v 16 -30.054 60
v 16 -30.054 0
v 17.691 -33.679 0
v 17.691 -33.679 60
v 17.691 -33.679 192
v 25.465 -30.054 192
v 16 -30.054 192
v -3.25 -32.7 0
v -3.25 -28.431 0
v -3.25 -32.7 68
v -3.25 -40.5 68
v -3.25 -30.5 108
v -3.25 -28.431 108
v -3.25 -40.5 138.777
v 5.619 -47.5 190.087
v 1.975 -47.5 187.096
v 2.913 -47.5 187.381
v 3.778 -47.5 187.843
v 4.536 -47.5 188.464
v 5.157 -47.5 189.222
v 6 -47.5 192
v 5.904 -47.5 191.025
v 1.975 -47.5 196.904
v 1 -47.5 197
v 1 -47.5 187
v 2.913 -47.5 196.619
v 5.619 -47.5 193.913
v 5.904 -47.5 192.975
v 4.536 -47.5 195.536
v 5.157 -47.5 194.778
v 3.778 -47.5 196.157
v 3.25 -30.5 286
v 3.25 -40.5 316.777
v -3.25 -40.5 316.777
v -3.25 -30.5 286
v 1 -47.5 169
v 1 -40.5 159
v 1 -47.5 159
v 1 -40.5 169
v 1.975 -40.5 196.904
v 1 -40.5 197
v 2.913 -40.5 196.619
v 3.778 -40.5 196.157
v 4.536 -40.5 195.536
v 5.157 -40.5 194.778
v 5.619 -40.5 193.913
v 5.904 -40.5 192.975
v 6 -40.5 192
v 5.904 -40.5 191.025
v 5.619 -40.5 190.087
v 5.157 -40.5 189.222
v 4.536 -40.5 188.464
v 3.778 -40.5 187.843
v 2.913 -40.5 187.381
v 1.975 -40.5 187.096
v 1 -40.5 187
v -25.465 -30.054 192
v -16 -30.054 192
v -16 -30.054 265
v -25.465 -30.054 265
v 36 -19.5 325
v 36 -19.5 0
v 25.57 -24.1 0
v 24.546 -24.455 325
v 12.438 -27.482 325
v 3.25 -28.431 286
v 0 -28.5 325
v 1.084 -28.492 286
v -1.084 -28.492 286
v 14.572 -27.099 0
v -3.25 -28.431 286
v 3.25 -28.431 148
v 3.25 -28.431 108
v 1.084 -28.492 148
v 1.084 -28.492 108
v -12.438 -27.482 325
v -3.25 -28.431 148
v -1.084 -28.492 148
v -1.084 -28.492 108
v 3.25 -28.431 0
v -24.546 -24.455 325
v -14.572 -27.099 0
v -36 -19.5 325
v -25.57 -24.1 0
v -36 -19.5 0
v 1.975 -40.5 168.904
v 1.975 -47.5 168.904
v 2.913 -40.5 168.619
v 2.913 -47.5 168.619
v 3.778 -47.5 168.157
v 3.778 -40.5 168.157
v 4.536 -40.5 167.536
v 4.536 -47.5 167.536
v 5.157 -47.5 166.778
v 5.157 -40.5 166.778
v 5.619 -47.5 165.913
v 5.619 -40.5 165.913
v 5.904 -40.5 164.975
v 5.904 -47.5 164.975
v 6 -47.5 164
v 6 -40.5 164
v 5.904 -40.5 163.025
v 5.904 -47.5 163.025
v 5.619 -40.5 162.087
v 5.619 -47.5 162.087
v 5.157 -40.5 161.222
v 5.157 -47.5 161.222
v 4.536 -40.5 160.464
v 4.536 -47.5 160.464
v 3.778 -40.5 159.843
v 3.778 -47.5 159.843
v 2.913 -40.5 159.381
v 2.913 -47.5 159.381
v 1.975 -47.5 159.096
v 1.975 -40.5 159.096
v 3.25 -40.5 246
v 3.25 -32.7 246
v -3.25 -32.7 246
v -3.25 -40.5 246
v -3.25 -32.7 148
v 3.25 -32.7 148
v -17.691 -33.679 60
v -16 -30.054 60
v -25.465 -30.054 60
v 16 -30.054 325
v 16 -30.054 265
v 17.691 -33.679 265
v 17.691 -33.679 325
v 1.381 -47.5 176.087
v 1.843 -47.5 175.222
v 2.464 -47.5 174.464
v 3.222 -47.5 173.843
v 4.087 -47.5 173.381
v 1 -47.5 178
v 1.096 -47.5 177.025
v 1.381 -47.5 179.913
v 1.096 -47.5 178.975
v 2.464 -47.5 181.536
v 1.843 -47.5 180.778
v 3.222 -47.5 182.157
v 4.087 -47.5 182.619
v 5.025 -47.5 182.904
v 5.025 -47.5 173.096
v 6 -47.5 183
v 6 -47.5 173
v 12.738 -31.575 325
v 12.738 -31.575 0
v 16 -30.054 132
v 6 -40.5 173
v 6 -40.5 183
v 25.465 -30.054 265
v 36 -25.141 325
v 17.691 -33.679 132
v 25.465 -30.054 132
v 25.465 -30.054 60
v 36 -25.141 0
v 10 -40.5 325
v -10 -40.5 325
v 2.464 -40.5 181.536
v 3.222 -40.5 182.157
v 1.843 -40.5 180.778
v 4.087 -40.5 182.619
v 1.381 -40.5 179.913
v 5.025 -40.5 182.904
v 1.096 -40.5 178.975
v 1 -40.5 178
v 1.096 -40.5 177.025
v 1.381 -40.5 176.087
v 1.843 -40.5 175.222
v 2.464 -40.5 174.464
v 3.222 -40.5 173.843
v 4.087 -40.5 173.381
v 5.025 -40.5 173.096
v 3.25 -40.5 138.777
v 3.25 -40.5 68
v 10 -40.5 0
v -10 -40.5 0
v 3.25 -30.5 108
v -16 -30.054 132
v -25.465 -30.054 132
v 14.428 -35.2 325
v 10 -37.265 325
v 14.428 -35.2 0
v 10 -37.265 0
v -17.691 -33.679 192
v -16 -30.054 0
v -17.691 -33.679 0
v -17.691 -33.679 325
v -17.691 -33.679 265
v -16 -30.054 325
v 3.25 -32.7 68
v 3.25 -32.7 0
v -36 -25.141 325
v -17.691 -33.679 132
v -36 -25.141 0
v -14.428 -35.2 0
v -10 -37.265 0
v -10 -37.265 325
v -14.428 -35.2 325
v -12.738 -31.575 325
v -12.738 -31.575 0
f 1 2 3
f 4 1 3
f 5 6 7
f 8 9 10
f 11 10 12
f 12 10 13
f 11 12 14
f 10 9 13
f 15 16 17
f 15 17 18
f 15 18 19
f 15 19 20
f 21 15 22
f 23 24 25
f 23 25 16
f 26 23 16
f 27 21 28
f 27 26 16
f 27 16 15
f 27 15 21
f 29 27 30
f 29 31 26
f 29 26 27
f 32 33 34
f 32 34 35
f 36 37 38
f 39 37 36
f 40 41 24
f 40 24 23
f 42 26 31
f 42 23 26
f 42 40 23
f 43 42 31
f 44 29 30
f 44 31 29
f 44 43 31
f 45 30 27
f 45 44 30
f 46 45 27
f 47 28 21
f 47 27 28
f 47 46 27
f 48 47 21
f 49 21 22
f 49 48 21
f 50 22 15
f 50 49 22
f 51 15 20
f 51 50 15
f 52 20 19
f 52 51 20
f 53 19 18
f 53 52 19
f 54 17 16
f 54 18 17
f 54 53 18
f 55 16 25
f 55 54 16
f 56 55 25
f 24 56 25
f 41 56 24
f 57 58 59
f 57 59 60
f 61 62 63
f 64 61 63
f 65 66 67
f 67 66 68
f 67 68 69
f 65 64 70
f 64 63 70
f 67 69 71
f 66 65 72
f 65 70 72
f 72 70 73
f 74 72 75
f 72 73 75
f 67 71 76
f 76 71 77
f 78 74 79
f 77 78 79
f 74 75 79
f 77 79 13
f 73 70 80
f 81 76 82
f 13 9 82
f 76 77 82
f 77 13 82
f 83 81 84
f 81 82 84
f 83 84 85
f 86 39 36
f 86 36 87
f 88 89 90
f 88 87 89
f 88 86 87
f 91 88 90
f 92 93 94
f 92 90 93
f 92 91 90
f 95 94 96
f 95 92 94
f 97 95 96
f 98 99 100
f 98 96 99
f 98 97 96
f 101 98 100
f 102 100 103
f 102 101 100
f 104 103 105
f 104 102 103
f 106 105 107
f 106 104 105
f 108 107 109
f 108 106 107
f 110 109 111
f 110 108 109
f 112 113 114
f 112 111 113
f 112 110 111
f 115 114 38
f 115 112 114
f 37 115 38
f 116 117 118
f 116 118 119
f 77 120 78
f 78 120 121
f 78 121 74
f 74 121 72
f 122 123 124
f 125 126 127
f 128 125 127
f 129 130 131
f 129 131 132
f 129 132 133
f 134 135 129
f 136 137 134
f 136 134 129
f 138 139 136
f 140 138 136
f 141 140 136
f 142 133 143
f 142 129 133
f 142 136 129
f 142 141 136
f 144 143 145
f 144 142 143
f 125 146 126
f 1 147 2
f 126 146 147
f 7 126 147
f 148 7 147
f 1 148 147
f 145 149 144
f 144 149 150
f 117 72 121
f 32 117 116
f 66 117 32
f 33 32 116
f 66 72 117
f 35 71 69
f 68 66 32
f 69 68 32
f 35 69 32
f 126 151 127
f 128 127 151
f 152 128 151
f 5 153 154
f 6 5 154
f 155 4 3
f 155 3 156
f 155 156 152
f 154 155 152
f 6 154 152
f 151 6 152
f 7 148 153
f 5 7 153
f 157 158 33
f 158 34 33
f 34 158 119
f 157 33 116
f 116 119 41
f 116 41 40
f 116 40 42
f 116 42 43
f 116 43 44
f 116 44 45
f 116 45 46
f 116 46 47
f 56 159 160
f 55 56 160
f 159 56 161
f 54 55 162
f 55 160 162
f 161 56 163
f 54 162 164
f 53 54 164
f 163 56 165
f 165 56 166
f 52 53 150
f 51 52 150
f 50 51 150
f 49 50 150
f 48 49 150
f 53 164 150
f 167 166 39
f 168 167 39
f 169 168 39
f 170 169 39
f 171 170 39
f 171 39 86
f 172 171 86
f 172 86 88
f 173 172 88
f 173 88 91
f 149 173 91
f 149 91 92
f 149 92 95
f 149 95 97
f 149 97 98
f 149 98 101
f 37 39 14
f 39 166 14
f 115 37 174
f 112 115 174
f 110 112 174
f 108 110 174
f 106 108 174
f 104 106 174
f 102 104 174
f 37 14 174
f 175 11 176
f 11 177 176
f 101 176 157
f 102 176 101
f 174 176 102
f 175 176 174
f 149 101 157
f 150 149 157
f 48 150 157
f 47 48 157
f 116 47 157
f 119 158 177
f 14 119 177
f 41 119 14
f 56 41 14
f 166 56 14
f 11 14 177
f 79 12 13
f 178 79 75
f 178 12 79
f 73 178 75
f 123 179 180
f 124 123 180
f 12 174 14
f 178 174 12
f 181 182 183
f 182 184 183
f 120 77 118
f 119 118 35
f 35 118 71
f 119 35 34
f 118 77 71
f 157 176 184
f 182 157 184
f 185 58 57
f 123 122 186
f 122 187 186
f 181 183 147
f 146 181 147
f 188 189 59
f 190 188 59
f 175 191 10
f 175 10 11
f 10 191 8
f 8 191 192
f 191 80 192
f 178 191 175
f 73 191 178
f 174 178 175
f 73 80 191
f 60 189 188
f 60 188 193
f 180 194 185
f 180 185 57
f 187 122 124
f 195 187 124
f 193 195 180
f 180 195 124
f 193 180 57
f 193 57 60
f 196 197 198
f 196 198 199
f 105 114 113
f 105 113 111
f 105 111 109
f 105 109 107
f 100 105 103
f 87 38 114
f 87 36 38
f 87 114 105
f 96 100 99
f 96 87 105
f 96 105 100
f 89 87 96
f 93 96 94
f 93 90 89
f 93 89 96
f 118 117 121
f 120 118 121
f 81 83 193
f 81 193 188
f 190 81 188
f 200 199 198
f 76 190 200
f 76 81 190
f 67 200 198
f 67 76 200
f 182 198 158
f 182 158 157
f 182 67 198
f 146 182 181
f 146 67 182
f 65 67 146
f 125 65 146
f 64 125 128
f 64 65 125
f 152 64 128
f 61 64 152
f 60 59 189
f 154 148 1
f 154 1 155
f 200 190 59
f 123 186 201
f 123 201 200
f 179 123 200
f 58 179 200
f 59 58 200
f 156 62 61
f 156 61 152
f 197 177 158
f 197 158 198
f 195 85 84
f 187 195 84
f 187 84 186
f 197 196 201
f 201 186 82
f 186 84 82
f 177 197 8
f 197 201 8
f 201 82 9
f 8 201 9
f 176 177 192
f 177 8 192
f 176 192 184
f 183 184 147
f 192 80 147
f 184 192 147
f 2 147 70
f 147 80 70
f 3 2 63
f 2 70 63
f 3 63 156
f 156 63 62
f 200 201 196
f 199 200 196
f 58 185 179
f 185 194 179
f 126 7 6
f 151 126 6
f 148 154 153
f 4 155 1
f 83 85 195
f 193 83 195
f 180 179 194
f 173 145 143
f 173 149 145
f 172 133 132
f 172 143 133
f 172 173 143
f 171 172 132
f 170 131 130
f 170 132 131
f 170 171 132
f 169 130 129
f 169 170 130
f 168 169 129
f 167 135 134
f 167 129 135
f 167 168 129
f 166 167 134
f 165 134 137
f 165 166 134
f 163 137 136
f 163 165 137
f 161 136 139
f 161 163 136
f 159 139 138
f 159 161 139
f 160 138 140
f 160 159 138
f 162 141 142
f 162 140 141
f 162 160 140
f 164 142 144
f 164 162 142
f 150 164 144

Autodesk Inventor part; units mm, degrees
sketch "Sketch1" plane through (0, 0, 0) normal (0, 0, 1) x (1, 0, 0)
  line L0 (0, 0) -> (-20.6965, 9.6509) construction
  line L1 (0, 0) -> (0, -60.6509) construction
  line L2 (0, 0) -> (-23.2307, -49.8183) construction
  line L3 (0, 0) -> (21.0241, 9.8037) construction
  line L4 (0, 0) -> (21.5225, -46.1553) construction
  line L5 (0, 0) -> (0, 48) construction
  arc A0 (-36, -19.5) -> (36, -19.5) centre (0, 48) ccw
  line L6 (-36, -19.5) -> (-36, -25.1413)
  line L7 (36, -19.5) -> (36, -25.1413)
  line L8 (-10, -40.5) -> (10, -40.5)
  line L9 (-10, -40.5) -> (-10, -37.2653)
  line L10 (10, -40.5) -> (10, -37.2653)
  line L11 (-17.6908, -33.679) -> (-16.0004, -30.0538)
  line L12 (-16.0004, -30.0538) -> (-12.7377, -31.5752)
  line L13 (-12.7377, -31.5752) -> (-14.4281, -35.2004)
  line L14 (14.4281, -35.2004) -> (12.7377, -31.5752)
  line L15 (12.7377, -31.5752) -> (16.0004, -30.0538)
  line L16 (16.0004, -30.0538) -> (17.6908, -33.679)
  line L17 (10, -37.2653) -> (14.4281, -35.2004)
  line L18 (17.6908, -33.679) -> (36, -25.1413)
  line L19 (-10, -37.2653) -> (-14.4281, -35.2004)
  line L20 (-17.6908, -33.679) -> (-36, -25.1413)
  dimension "d0" = 25
  dimension "d1" = 90
  dimension "d2" = 90
  dimension "d3" = 25
  dimension "d4" = 48
  dimension "d5" = 153
  dimension "d11" = 72
  dimension "d12" = 36
  dimension "d13" = 20
  dimension "d14" = 10
  dimension "d17" = 88.5
  dimension "d18" = 3.6
  dimension "d19" = 1.8
  dimension "d20" = 4
  dimension "d21" = 1.8
  dimension "d22" = 1.8
  dimension "d23" = 4
extrude "Extrusion1" add sketch "Sketch1" along normal blind 325
ref_plane "Work Plane1" through (0, 0, 60) normal (0, 0, -1) x (-1, 0, 0)
sketch "Sketch2" plane through (0, 0, 60) normal (0, 0, -1) x (-1, 0, 0)
  line L0 (14.4281, -35.2004) -> (12.7377, -31.5752)
  line L1 (12.7377, -31.5752) -> (16.0004, -30.0538)
  line L2 (14.4281, -35.2004) -> (10, -37.2653) projected
  line L3 (16.0004, -30.0538) -> (25.4652, -30.0538)
  line L4 (25.4652, -30.0538) -> (14.4281, -35.2004)
  line L5 (12.7377, -31.5752) -> (14.4281, -35.2004) projected
  line L6 (16.0004, -30.0538) -> (12.7377, -31.5752) projected
  line L7 (36, -25.1413) -> (17.6908, -33.679) projected
  line L8 (10, -40.5) -> (-10, -40.5) projected
  line L9 (-14.4281, -35.2004) -> (-12.7377, -31.5752)
  line L10 (-12.7377, -31.5752) -> (-16.0004, -30.0538)
  line L11 (-16.0004, -30.0538) -> (-25.4652, -30.0538)
  line L12 (-25.4652, -30.0538) -> (-14.4281, -35.2004)
  line L13 (-14.4281, -35.2004) -> (-12.7377, -31.5752) projected
  line L14 (-12.7377, -31.5752) -> (-16.0004, -30.0538) projected
  line L15 (-10, -37.2653) -> (-14.4281, -35.2004) projected
  line L16 (-17.6908, -33.679) -> (-36, -25.1413) projected
  point P0 (0, 0)
extrude "Extrusion2" cut sketch "Sketch2" against normal blind 72
ref_plane "Work Plane2" through (0, 0, 192) normal (0, 0, -1) x (-1, 0, 0)
sketch "Sketch3" plane through (0, 0, 192) normal (0, 0, -1) x (-1, 0, 0)
  line L0 (14.4281, -35.2004) -> (12.7377, -31.5752)
  line L1 (12.7377, -31.5752) -> (14.4281, -35.2004) projected
  line L2 (12.7377, -31.5752) -> (16.0004, -30.0538)
  line L3 (16.0004, -30.0538) -> (25.4652, -30.0538)
  line L4 (25.4652, -30.0538) -> (14.4281, -35.2004)
  line L5 (-14.4281, -35.2004) -> (-12.7377, -31.5752)
  line L6 (-12.7377, -31.5752) -> (-16.0004, -30.0538)
  line L7 (-16.0004, -30.0538) -> (-25.4652, -30.0538)
  line L8 (-25.4652, -30.0538) -> (-14.4281, -35.2004)
  line L9 (16.0004, -30.0538) -> (12.7377, -31.5752) projected
  line L10 (14.4281, -35.2004) -> (10, -37.2653) projected
  line L11 (-14.4281, -35.2004) -> (-12.7377, -31.5752) projected
  line L12 (-12.7377, -31.5752) -> (-16.0004, -30.0538) projected
  line L13 (-10, -37.2653) -> (-14.4281, -35.2004) projected
  line L14 (10, -40.5) -> (-10, -40.5) projected
  line L15 (36, -25.1413) -> (17.6908, -33.679) projected
  point P0 (0, 0)
extrude "Extrusion3" cut sketch "Sketch3" against normal blind 73
ref_plane "Work Plane3" through (0, -25.1413, 0) normal (-1, 0, 0) x (0, 0, 1)
sketch "Sketch5" plane through (0, -25.1413, 0) normal (-1, 0, 0) x (0, 0, 1)
  line L0 (0, -7.5587) -> (0, -3.3587)
  line L1 (68, -7.5587) -> (68, -15.3587)
  line L2 (68, -15.3587) -> (138.7768, -15.3587)
  line L3 (138.7768, -15.3587) -> (108, -5.3587)
  line L4 (108, -5.3587) -> (108, -3.3587)
  line L5 (0, -15.3587) -> (325, -15.3587) projected
  line L6 (246, -7.5587) -> (246, -15.3587)
  line L7 (246, -15.3587) -> (316.7768, -15.3587)
  line L8 (68, -7.5587) -> (0, -7.5587)
  line L9 (286, -3.3587) -> (286, -5.3587)
  line L10 (316.7768, -15.3587) -> (286, -5.3587)
  line L11 (0, -3.3587) -> (0, -0.3587)
  line L12 (0, -8.5377) -> (0, 0) projected
  line L13 (0, 5.6413) -> (325, 5.6413) projected
  line L14 (286, -0.3587) -> (286, -3.3587)
  line L15 (246, -7.5587) -> (148, -7.5587)
  line L16 (148, -7.5587) -> (148, -3.3587)
  line L17 (108, -0.3587) -> (108, -3.3587)
  line L18 (325, -3.3587) -> (0, -3.3587) projected
  line L19 (148, -3.3587) -> (148, -0.3587)
  line L20 (0, -3.3587) -> (108, -3.3587)
  line L21 (148, -3.3587) -> (286, -3.3587)
  line L22 (0, -0.3587) -> (108, -0.3587)
  line L23 (148, -0.3587) -> (286, -0.3587)
  point P0 (0, 25.1413)
  dimension "d51" = 4.2
  dimension "d52" = 0
  dimension "d53" = 68
  dimension "d54" = 2
  dimension "d56" = 40
  dimension "d59" = 246
  dimension "d64" = 18
  dimension "d65" = 2
  dimension "d68" = 3
  dimension "d69" = 40
  dimension "d84" = 178
  dimension "d94" = 18
  dimension "d96" = 40
extrude "Extrusion4" cut sketch "Sketch5" along normal mid plane 6.5 contours L0 L18 L4 L3 L2 L1 L8 | L11 L22 L17 L18 | L18 L9 L10 L5 L6 L15 L16 | L19 L23 L14 L18
sketch "Sketch6" plane through (-10, -40.5, 0) normal (0, -1, 0) x (1, 0, 0)
  line L0 (-49, 178) -> (79, 178) construction
  line L1 (10, 0) -> (10, 369) construction
  arc A0 (11, 159) -> (11, 169) centre (11, 164) ccw
  arc A1 (16, 183) -> (16, 173) centre (16, 178) ccw
  line L2 (11, 159) -> (11, 169)
  line L3 (16, 173) -> (16, 183)
  line L4 (11, 187) -> (11, 197)
  arc A2 (11, 187) -> (11, 197) centre (11, 192) ccw
  point P0 (4, 178)
  dimension "d70" = 178
  dimension "d85" = 1
  dimension "d86" = 5
  dimension "d87" = 5
  dimension "d88" = 6
  dimension "d89" = 5
  dimension "d90" = 1
  dimension "d91" = 14
  dimension "d92" = 14
extrude "Extrusion5" add sketch "Sketch6" along normal blind 7
equation "\"BendRadius\" = Thickness"
equation "\"BendReliefWidth\" = Thickness"
equation "\"BendReliefDepth\" = 0.5 * Thickness"
equation "\"CornerReliefSize\" = 4 * Thickness"
equation "\"MinimumRemnant\" = 2 * Thickness"
equation "\"TransitionRadius\" = BendRadius"
equation "\"JacobiRadiusSize\" = BendRadius"
equation "\"GapSize\" = Thickness"
equation "\"Thickness\" = 0.5"
properties part number "3213_Bed Holder" material "Acetal Resin, White"
